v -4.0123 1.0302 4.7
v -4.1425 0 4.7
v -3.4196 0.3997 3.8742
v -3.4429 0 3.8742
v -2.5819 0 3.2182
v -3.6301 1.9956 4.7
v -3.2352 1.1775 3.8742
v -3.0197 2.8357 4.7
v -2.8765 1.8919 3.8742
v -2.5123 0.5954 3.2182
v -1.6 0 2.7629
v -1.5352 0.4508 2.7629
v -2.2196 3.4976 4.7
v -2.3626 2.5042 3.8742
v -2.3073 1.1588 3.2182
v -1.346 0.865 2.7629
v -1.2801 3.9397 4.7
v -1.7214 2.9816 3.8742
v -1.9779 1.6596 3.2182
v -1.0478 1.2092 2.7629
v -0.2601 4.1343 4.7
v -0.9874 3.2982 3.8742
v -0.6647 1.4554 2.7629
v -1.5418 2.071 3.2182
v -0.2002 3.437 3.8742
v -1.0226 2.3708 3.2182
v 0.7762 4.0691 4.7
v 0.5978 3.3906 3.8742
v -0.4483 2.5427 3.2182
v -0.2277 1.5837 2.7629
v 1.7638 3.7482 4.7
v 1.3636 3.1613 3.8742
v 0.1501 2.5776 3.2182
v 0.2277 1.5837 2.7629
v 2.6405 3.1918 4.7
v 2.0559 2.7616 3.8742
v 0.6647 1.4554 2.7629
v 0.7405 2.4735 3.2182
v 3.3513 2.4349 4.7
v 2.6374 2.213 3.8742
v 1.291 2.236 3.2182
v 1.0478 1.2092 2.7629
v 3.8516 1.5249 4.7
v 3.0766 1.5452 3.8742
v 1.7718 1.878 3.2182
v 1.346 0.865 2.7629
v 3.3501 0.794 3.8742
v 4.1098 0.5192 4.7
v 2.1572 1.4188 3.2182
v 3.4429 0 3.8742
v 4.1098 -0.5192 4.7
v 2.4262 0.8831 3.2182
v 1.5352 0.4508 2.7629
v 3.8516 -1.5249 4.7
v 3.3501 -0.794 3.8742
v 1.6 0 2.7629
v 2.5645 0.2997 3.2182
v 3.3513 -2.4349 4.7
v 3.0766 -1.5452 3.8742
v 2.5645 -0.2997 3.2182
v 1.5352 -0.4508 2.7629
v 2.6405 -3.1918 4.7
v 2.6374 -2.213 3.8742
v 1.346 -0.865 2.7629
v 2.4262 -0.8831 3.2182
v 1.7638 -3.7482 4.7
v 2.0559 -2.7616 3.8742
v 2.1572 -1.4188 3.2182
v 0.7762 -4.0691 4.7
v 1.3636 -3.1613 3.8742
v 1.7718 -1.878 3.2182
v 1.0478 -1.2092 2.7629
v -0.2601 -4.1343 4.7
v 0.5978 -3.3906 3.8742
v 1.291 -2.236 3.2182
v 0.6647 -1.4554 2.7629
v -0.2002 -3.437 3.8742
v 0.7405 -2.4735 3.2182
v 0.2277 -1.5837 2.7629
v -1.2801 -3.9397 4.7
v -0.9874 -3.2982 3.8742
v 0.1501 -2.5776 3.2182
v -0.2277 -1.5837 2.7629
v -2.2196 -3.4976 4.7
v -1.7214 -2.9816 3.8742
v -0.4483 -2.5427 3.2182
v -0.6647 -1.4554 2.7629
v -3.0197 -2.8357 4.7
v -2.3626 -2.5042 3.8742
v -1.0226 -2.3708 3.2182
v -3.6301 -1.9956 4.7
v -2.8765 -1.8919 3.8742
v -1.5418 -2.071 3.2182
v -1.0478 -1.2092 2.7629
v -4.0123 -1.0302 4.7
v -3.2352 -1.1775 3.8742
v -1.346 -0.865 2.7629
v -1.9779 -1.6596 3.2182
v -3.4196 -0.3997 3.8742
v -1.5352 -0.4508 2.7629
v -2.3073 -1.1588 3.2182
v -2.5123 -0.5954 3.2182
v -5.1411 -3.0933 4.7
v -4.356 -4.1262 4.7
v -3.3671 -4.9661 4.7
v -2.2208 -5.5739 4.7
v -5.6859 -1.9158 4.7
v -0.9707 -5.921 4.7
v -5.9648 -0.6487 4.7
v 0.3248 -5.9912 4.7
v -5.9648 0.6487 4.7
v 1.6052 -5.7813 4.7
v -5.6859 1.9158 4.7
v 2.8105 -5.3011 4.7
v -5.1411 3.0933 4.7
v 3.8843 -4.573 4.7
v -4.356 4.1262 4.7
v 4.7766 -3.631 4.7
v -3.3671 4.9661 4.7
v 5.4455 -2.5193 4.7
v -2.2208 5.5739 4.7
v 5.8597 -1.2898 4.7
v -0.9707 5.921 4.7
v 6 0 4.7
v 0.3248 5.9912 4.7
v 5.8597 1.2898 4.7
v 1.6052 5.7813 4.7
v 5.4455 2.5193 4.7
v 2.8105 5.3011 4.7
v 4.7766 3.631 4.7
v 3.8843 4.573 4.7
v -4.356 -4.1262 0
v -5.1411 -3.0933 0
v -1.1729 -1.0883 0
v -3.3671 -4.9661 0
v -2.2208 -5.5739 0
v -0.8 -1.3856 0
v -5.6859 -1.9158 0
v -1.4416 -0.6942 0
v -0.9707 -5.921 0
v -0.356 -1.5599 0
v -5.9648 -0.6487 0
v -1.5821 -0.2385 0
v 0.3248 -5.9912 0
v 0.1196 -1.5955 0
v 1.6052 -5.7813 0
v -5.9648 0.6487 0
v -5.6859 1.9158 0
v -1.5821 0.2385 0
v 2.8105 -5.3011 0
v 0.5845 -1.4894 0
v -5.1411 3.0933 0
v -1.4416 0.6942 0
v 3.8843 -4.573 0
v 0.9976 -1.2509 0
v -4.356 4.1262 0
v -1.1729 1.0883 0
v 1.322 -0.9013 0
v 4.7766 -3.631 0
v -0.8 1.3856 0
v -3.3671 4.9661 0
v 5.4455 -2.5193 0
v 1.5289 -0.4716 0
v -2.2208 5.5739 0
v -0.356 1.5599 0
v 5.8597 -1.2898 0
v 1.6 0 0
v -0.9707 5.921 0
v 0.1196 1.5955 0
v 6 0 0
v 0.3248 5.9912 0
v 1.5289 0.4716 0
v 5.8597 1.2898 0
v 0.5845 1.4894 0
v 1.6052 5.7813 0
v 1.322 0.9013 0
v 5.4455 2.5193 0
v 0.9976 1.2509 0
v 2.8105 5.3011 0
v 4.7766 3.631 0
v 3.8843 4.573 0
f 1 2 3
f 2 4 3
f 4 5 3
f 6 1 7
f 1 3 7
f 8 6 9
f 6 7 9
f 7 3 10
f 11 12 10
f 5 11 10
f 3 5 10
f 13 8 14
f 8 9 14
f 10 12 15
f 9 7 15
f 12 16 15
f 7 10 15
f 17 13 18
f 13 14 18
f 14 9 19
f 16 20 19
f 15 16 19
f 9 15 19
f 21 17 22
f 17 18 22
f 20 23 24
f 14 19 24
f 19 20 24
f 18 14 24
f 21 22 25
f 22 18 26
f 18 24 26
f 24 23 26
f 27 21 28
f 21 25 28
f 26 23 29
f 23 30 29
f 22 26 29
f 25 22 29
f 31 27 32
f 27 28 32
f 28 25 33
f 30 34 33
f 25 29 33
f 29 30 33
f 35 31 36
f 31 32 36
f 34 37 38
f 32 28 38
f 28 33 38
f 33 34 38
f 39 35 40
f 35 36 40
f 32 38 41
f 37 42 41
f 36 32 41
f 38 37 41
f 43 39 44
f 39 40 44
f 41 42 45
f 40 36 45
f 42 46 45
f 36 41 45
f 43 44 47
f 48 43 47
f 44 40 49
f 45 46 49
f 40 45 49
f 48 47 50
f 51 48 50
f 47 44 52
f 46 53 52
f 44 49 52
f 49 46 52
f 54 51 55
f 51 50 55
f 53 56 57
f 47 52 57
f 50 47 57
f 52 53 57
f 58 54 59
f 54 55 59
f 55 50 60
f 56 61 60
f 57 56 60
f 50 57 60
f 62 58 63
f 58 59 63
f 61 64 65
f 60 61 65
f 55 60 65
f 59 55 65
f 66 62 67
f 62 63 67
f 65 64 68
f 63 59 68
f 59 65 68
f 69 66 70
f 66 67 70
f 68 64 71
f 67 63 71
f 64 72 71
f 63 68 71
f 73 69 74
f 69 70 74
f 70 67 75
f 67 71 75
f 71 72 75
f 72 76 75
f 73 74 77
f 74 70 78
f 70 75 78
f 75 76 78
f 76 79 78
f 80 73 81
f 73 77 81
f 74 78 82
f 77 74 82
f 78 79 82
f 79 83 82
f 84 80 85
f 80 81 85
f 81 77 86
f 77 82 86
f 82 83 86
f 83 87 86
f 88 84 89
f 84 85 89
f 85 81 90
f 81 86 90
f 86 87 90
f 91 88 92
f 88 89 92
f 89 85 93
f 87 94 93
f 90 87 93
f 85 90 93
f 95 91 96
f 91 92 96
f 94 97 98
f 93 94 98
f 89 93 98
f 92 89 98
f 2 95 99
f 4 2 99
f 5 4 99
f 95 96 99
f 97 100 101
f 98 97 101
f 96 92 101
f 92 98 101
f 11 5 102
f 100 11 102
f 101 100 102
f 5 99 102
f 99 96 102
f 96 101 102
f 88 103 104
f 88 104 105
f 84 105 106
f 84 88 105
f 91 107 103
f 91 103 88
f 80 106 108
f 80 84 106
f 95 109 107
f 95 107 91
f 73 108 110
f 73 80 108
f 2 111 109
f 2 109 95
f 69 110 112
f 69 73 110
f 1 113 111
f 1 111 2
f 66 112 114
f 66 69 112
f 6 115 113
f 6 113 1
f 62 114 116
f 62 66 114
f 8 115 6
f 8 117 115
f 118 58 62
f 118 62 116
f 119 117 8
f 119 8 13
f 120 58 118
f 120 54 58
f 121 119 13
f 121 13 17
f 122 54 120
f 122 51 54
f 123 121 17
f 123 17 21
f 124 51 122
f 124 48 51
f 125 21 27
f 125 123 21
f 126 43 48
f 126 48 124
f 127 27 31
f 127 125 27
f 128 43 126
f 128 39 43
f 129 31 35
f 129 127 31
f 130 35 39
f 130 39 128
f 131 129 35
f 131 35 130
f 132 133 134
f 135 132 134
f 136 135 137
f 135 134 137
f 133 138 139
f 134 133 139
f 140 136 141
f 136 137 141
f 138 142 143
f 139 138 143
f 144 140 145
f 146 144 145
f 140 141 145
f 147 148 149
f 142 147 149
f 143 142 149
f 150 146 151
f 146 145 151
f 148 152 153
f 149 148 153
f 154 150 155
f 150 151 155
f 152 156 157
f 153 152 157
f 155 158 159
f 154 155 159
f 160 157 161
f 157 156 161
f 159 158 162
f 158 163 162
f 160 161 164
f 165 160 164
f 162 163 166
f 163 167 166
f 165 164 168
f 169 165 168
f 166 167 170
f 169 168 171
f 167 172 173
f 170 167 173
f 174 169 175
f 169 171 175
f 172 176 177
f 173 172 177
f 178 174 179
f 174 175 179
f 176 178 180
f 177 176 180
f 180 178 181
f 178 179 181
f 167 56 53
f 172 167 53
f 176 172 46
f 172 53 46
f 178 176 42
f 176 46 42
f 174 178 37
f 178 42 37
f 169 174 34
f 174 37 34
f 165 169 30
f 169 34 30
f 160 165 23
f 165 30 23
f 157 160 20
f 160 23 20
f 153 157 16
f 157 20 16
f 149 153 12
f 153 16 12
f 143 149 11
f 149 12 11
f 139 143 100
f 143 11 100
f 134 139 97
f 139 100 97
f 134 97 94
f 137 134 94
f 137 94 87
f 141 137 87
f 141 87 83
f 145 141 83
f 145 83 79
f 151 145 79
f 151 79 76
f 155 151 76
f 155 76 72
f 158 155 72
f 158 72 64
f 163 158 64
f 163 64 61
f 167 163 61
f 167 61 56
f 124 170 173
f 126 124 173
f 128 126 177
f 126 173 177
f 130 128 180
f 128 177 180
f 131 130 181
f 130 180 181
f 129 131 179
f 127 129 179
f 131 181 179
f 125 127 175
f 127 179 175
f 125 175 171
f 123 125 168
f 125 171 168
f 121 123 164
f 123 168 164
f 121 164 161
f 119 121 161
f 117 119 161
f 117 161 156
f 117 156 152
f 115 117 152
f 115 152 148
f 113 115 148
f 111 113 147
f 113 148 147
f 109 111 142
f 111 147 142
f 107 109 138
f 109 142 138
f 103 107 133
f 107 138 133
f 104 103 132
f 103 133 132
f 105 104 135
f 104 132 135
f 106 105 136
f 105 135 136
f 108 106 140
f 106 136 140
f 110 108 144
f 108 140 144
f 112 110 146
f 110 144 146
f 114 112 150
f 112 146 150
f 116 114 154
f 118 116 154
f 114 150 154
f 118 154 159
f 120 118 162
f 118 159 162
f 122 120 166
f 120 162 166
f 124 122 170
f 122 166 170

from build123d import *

# Parameters (mm, degrees)
F0_R     = 6
F1_DEPTH = 4.7
F2_R     = 1.6
F3_DEPTH = 25


with BuildPart() as f1:
    # F0 (on Top) → F1 (new body)
    with BuildSketch(Plane.XY):
        Circle(F0_R)
    extrude(amount=F1_DEPTH)

    # F2 (on face) → F3 (cut)
    with BuildSketch(Plane.XY.offset(4.7)):
        Circle(F2_R)
    extrude(amount=-F3_DEPTH, mode=Mode.SUBTRACT)

    # F4 (on Front) → F5 (revolve, cut)
    with BuildSketch(Plane.XZ):
        with BuildLine():
            Line((0, 2.5), (0, 12.5))
            ThreePointArc((0, 12.5), (-5, 7.5), (0, 2.5))
        make_face()
    revolve(axis=Axis((0, 0, 7.5), (0, 0, -1)), mode=Mode.SUBTRACT)


solid = f1.part
